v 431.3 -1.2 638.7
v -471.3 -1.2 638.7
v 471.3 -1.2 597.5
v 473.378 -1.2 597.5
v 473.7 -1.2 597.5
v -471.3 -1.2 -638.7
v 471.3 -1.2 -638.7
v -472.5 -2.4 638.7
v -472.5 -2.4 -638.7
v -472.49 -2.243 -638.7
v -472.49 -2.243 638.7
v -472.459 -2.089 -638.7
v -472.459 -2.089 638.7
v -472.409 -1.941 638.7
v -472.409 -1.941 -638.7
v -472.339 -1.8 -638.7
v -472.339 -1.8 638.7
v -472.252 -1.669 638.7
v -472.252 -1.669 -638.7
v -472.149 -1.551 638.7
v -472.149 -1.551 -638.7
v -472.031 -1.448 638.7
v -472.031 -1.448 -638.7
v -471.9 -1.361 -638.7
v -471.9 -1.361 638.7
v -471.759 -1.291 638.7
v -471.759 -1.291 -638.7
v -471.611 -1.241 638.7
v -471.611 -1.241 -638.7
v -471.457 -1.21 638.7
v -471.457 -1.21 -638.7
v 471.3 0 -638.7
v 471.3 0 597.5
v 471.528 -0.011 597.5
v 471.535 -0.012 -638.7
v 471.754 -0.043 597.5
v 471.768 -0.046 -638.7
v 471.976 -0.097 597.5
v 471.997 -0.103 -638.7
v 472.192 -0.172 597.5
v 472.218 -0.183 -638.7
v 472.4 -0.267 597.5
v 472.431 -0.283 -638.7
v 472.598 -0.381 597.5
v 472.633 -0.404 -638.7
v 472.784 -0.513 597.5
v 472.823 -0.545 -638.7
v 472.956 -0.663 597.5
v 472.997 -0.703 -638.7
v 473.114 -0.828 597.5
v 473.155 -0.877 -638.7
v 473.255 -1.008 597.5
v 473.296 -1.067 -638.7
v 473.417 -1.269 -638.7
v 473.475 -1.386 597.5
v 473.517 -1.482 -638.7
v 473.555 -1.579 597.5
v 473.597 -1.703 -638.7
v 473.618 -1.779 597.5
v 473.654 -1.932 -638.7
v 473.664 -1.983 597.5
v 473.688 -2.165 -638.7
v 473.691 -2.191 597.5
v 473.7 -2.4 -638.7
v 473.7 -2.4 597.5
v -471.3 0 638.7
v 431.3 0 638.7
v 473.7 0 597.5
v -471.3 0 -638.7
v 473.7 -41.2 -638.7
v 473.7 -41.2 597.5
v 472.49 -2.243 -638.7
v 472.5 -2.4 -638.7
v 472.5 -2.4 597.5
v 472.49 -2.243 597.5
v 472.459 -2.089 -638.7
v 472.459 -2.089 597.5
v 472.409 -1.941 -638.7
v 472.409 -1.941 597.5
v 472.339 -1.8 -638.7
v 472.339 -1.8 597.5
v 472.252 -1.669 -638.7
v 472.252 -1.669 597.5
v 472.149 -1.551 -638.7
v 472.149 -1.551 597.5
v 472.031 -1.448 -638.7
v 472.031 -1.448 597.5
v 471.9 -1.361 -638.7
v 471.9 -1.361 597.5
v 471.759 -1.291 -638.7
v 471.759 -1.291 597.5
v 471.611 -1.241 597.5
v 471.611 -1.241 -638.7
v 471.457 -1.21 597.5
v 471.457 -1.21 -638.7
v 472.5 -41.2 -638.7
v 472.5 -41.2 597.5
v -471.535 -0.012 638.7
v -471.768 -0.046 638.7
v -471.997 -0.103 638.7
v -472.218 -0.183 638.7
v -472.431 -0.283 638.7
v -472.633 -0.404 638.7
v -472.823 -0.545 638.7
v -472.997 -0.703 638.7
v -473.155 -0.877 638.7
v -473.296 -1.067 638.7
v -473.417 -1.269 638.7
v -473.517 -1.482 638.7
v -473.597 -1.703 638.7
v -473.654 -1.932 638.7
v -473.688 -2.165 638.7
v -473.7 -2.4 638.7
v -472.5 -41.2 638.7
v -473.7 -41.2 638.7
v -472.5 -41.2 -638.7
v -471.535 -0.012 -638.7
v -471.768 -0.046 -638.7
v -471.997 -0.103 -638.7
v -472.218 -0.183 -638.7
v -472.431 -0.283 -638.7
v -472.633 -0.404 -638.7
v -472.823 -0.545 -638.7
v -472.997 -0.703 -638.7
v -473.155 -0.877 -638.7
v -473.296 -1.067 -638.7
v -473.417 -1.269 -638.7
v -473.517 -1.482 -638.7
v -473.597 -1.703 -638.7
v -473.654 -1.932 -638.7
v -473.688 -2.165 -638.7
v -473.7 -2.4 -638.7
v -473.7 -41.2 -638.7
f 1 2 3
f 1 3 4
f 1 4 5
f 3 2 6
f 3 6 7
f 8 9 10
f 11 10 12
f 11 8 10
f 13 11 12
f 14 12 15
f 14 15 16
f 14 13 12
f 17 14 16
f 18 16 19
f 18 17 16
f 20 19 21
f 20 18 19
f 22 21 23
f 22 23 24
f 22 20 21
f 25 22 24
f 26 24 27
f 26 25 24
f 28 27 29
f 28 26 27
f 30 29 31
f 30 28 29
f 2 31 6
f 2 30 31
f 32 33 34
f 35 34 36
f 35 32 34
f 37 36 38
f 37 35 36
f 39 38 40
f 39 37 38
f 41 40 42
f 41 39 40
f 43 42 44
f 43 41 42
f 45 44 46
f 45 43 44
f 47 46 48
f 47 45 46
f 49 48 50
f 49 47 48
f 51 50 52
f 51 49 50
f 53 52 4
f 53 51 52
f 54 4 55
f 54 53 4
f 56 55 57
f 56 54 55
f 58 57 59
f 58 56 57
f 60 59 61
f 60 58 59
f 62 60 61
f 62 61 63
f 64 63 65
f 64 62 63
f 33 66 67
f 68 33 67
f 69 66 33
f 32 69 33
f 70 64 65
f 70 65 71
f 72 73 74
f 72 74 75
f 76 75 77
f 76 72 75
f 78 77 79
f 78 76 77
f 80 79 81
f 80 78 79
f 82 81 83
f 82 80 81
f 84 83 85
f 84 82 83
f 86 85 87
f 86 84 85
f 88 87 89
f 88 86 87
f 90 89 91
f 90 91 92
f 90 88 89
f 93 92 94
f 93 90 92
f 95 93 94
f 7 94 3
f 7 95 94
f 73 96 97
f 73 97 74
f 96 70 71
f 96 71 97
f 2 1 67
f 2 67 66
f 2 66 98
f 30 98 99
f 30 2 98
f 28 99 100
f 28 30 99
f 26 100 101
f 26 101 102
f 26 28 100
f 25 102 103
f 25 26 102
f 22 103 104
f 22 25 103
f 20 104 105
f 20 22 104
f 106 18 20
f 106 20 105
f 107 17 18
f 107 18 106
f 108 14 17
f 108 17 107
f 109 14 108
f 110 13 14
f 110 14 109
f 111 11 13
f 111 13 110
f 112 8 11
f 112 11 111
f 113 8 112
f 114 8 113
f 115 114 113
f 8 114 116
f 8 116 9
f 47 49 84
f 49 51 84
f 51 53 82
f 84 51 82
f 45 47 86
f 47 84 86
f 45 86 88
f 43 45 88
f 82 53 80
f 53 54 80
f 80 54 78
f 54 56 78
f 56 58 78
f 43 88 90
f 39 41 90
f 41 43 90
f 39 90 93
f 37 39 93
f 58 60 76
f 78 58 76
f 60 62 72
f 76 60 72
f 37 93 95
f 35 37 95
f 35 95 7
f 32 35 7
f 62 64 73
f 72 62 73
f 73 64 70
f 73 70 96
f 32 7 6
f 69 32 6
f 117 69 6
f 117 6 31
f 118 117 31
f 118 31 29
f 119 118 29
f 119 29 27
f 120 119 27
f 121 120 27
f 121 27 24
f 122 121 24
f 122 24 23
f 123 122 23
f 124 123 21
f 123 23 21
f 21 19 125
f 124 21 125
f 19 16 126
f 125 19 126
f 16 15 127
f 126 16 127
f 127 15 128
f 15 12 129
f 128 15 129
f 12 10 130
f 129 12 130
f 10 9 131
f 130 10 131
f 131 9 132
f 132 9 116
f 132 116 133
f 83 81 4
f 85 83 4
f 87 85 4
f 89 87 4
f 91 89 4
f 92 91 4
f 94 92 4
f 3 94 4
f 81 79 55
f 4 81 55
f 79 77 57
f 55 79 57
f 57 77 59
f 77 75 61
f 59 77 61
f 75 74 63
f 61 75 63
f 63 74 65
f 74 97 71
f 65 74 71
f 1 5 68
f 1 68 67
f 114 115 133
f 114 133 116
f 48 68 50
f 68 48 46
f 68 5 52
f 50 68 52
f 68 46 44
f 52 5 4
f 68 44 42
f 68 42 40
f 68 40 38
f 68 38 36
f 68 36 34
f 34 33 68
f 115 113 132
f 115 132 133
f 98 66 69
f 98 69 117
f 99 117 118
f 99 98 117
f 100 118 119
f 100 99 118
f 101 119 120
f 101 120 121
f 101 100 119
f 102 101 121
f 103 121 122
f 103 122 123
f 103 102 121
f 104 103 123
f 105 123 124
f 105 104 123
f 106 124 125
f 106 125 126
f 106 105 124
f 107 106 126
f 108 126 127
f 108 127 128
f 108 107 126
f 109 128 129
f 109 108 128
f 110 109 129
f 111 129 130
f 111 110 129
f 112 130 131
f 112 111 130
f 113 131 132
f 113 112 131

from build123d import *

# Parameters (mm, degrees)
SKETCH1_W                      = 947.4
SKETCH1_H                      = 1277.4
BASE_FLANGE1_DEPTH             = 1.2
CUT_EXTRUDE1_DEPTH             = 10
EDGE_FLANGE1_STRIP_W           = 7.2
EDGE_FLANGE1_STRIP_H           = 1.2
EDGE_FLANGE1_STRIP_CUT_DEPTH   = 1236.2
EDGE_FLANGE1_STRIP_2_W         = 7.2
EDGE_FLANGE1_STRIP_2_H         = 1.2
EDGE_FLANGE1_STRIP_CUT_2_DEPTH = 1277.4
EDGE_FLANGE1_DEPTH             = 1236.2
EDGE_FLANGE1_BEND_DEPTH        = 1277.4


# Sheet-metal steps are written as plain solids
with BuildPart() as part:
    # Sketch1 → Base-Flange1 (new body)
    with BuildSketch(Plane(origin=(0, 0, 0), x_dir=(1, 0, 0), z_dir=(0, 1, 0))):
        Rectangle(SKETCH1_W, SKETCH1_H)
    extrude(amount=-BASE_FLANGE1_DEPTH)

    # Sketch3 → Cut-Extrude1 (cut)
    with BuildSketch(Plane.XZ.offset(1.2)):
        Polygon((431.3, 638.7), (512.405547978, 658.605547978), (473.7, 597.5), align=None)
    extrude(amount=-CUT_EXTRUDE1_DEPTH, mode=Mode.SUBTRACT)

    # Edge-Flange1 strip (across the edge) → Edge-Flange1 strip cut (cut)
    with BuildSketch(Plane(origin=(473.7, -1.2, -638.7), x_dir=(-1, 0, 0), z_dir=(0, 0, 1))):
        with Locations((-1.2, -0.6)):
            Rectangle(EDGE_FLANGE1_STRIP_W, EDGE_FLANGE1_STRIP_H)
    extrude(amount=EDGE_FLANGE1_STRIP_CUT_DEPTH, mode=Mode.SUBTRACT)

    # Edge-Flange1 strip 2 (across the edge) → Edge-Flange1 strip cut 2 (cut)
    with BuildSketch(Plane(origin=(-473.7, -1.2, 638.7), x_dir=(1, 0, 0), z_dir=(0, 0, -1))):
        with Locations((-1.2, -0.6)):
            Rectangle(EDGE_FLANGE1_STRIP_2_W, EDGE_FLANGE1_STRIP_2_H)
    extrude(amount=EDGE_FLANGE1_STRIP_CUT_2_DEPTH, mode=Mode.SUBTRACT)

    # Edge-Flange1 section (across the edge) → Edge-Flange1 (add)
    with BuildSketch(Plane(origin=(473.7, -1.2, -638.7), x_dir=(-1, 0, 0), z_dir=(0, 0, 1))):
        with BuildLine():
            Line((0, 1.2), (0, 40))
            Line((0, 40), (1.2, 40))
            Line((1.2, 40), (1.2, 1.2))
            ThreePointArc((1.2, 1.2), (1.551471863, 0.351471863), (2.4, 0))
            Line((2.4, 0), (2.4, -1.2))
            ThreePointArc((2.4, -1.2), (0.702943725, -0.497056275), (0, 1.2))
        make_face()
    extrude(amount=EDGE_FLANGE1_DEPTH)

    # Edge-Flange1 section 2 (across the edge) → Edge-Flange1 bend (add)
    with BuildSketch(Plane(origin=(-473.7, -1.2, 638.7), x_dir=(1, 0, 0), z_dir=(0, 0, -1))):
        with BuildLine():
            Line((0, 1.2), (0, 40))
            Line((0, 40), (1.2, 40))
            Line((1.2, 40), (1.2, 1.2))
            ThreePointArc((1.2, 1.2), (1.551471863, 0.351471863), (2.4, 0))
            Line((2.4, 0), (2.4, -1.2))
            ThreePointArc((2.4, -1.2), (0.702943725, -0.497056275), (0, 1.2))
        make_face()
    extrude(amount=EDGE_FLANGE1_BEND_DEPTH)


solid = part.part
